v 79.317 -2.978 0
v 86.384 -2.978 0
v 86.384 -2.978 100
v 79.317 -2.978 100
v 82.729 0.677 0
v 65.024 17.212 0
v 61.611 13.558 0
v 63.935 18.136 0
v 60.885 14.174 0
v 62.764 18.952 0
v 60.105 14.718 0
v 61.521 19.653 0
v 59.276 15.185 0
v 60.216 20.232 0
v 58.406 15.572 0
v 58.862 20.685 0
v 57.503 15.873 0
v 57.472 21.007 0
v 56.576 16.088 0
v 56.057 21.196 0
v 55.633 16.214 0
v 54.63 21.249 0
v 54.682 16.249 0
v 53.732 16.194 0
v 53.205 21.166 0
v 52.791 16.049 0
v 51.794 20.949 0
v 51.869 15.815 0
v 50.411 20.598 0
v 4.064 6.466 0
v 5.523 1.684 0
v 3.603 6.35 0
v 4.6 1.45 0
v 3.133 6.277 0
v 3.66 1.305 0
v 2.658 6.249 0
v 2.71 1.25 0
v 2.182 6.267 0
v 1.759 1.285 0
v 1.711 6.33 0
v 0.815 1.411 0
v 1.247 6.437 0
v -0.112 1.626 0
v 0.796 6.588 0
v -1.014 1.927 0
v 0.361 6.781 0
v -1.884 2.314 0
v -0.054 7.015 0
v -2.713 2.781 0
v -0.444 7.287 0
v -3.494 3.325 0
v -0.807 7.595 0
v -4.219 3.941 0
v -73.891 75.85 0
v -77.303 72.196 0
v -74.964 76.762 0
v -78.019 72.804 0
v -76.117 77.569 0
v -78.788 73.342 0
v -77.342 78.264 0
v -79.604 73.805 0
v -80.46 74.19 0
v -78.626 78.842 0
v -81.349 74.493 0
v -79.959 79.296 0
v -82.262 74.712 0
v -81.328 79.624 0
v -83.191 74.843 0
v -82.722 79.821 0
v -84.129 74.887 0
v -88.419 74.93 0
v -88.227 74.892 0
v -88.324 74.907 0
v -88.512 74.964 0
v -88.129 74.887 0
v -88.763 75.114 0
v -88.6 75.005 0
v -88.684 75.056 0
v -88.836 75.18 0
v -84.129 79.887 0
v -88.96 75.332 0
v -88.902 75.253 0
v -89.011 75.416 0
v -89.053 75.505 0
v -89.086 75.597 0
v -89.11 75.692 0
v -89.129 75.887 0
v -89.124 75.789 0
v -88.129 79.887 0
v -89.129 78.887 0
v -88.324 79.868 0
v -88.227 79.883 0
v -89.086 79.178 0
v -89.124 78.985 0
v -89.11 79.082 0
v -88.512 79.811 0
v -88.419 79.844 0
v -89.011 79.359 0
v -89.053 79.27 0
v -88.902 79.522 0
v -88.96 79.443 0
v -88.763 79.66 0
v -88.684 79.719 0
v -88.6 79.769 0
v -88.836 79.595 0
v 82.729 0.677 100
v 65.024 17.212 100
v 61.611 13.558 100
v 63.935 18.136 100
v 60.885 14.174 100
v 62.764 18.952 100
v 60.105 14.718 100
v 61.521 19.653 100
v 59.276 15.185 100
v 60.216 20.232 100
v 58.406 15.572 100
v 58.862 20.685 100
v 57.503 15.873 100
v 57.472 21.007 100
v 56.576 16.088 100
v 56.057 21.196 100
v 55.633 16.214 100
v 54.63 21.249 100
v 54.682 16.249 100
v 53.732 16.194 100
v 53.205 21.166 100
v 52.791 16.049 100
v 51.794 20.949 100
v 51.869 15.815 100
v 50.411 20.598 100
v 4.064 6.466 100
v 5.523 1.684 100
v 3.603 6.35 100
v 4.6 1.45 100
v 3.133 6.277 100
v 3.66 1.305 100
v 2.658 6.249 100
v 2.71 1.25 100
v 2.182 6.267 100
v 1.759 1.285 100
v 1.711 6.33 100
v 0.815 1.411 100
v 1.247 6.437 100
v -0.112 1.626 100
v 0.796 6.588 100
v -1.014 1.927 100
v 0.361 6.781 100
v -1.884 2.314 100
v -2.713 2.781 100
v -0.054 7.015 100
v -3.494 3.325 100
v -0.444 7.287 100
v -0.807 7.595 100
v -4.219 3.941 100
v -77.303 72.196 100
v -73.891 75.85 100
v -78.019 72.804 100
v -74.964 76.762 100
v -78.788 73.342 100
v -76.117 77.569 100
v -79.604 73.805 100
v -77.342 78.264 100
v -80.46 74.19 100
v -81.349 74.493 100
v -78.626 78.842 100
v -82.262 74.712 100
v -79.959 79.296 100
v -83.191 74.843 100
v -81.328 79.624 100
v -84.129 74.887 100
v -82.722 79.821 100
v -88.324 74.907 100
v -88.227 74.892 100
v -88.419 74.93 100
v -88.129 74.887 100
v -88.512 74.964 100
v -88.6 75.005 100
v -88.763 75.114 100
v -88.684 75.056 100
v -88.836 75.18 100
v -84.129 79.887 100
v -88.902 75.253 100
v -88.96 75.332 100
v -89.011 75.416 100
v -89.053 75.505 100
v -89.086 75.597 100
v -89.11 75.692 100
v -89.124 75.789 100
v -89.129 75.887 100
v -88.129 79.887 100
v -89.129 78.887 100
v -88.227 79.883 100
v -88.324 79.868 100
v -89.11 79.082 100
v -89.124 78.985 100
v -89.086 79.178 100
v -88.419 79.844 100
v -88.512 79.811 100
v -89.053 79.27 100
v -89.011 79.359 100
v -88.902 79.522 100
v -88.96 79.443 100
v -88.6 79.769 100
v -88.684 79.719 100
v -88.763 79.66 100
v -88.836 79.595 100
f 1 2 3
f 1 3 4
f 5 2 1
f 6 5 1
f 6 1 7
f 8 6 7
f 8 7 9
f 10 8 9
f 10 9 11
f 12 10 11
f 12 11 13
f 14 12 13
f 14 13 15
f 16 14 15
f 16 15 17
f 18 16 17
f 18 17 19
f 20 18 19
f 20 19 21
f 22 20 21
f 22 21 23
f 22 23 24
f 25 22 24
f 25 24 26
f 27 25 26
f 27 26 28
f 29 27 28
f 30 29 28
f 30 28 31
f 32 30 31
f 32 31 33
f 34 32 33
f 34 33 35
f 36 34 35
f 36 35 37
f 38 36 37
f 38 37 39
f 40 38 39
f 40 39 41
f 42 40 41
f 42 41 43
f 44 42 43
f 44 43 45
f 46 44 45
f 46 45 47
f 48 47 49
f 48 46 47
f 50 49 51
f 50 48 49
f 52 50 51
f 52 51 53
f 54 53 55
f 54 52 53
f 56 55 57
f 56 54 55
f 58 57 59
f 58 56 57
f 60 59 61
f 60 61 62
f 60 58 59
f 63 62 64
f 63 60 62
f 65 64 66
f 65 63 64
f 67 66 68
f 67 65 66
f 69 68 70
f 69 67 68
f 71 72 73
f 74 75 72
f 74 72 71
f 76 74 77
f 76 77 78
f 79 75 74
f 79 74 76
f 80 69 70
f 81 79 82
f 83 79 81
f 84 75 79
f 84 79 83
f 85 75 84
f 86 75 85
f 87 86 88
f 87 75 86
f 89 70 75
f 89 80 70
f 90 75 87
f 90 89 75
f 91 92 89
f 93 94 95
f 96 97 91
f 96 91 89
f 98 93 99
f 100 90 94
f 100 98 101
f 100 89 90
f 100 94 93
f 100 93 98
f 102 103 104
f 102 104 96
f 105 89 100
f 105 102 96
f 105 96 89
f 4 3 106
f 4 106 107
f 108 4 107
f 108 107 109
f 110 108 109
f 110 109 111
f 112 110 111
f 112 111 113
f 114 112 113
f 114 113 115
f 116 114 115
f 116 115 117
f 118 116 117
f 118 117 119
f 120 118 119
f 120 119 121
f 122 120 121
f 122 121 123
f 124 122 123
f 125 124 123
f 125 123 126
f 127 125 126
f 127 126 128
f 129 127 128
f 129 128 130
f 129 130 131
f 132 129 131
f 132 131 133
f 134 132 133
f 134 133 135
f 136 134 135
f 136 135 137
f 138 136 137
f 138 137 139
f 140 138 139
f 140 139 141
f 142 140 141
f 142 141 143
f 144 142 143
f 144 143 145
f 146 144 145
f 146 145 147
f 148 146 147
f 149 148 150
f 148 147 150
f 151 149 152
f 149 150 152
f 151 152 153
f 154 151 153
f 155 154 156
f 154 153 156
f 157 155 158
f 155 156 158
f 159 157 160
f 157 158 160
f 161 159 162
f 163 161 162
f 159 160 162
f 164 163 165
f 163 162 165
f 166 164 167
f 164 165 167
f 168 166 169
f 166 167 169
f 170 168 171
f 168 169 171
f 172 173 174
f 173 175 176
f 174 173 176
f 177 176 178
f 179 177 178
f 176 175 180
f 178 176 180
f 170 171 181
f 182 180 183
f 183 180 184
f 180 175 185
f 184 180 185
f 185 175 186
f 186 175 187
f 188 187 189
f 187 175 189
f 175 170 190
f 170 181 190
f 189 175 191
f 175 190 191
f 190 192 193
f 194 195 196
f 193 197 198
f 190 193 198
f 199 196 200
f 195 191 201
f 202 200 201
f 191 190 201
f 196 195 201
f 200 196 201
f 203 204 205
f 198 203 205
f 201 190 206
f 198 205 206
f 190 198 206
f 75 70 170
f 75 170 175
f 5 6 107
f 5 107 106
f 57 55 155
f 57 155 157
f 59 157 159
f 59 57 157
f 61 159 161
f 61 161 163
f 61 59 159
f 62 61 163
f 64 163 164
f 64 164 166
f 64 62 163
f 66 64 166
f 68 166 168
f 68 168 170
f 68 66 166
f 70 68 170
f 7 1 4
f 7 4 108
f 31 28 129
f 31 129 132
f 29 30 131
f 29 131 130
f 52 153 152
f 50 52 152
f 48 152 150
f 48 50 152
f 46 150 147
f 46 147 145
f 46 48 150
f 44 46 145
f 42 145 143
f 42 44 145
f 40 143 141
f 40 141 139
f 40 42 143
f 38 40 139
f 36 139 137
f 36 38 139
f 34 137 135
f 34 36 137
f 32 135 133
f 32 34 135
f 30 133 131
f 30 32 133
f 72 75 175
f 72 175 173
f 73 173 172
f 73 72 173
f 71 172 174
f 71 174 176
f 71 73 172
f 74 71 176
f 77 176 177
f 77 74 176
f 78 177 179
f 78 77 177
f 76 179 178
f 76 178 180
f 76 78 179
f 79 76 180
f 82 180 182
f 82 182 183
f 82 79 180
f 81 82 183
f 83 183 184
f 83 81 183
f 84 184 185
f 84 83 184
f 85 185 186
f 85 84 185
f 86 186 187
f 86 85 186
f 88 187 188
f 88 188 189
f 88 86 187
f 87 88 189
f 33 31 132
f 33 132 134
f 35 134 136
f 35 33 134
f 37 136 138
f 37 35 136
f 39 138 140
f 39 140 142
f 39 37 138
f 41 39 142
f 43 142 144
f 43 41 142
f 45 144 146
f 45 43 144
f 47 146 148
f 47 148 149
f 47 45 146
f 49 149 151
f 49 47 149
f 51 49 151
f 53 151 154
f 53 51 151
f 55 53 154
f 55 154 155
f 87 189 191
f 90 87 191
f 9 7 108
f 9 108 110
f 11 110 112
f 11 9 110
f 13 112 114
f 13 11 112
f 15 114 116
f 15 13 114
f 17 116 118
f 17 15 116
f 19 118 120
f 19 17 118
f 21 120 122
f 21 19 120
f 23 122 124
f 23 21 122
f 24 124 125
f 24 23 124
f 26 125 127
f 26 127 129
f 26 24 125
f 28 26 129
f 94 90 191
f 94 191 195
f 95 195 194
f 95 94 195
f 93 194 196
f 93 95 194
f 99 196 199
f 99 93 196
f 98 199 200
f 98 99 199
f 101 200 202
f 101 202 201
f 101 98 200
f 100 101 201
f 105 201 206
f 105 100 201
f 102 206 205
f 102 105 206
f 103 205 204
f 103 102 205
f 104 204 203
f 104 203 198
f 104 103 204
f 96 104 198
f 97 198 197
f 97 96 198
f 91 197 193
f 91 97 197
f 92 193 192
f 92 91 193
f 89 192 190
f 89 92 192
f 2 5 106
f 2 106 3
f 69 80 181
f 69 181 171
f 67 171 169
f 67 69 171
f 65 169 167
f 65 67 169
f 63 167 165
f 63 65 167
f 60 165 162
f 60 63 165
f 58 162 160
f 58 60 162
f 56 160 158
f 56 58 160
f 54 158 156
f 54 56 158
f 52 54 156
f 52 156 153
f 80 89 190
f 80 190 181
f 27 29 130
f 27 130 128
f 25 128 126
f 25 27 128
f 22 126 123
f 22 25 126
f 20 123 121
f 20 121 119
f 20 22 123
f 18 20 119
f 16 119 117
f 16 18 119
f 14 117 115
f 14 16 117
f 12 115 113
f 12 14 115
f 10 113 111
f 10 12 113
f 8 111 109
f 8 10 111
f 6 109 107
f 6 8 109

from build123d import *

# Parameters (mm, degrees)
EXTRUDE_1_DEPTH = 100


with BuildPart() as part:
    # 草图1 → 凸台-拉伸1 (new body)
    with BuildSketch(Plane.XY):
        with BuildLine():
            Line((-4.219496526, 3.940708363), (-77.303320181, 72.195779383))
            ThreePointArc((-77.303320181, 72.195779383), (-80.46030058, 74.190187557), (-84.128827283, 74.887397018))
            Line((-84.128827283, 74.887397018), (-88.128827283, 74.887397018))
            ThreePointArc((-88.128827283, 74.887397018), (-88.835934064, 75.180290236), (-89.128827283, 75.887397018))
            Line((-89.128827283, 75.887397018), (-89.128827283, 78.887397018))
            ThreePointArc((-89.128827283, 78.887397018), (-88.835934064, 79.594503799), (-88.128827283, 79.887397018))
            Line((-88.128827283, 79.887397018), (-84.128827283, 79.887397018))
            ThreePointArc((-84.128827283, 79.887397018), (-78.626037228, 78.841582827), (-73.89056663, 75.849970566))
            Line((-73.89056663, 75.849970566), (-0.806742975, 7.594899545))
            ThreePointArc((-0.806742975, 7.594899545), (1.477574895, 6.378091558), (4.064256195, 6.466463865))
            Line((4.064256195, 6.466463865), (50.410774928, 20.59773729))
            ThreePointArc((50.410774928, 20.59773729), (58.170818827, 20.86285421), (65.023772438, 17.212430248))
            Line((65.023772438, 17.212430248), (82.729423008, 0.676617305))
            Line((82.729423008, 0.676617305), (86.383614191, -2.977573878))
            Line((86.383614191, -2.977573878), (79.316669457, -2.977573878))
            Line((79.316669457, -2.977573878), (61.611018887, 13.558239066))
            ThreePointArc((61.611018887, 13.558239066), (57.042383146, 15.99185504), (51.869020547, 15.815110427))
            Line((51.869020547, 15.815110427), (5.522501814, 1.683837001))
            ThreePointArc((5.522501814, 1.683837001), (0.349139215, 1.507092388), (-4.219496526, 3.940708363))
        make_face()
    extrude(amount=EXTRUDE_1_DEPTH)


solid = part.part
